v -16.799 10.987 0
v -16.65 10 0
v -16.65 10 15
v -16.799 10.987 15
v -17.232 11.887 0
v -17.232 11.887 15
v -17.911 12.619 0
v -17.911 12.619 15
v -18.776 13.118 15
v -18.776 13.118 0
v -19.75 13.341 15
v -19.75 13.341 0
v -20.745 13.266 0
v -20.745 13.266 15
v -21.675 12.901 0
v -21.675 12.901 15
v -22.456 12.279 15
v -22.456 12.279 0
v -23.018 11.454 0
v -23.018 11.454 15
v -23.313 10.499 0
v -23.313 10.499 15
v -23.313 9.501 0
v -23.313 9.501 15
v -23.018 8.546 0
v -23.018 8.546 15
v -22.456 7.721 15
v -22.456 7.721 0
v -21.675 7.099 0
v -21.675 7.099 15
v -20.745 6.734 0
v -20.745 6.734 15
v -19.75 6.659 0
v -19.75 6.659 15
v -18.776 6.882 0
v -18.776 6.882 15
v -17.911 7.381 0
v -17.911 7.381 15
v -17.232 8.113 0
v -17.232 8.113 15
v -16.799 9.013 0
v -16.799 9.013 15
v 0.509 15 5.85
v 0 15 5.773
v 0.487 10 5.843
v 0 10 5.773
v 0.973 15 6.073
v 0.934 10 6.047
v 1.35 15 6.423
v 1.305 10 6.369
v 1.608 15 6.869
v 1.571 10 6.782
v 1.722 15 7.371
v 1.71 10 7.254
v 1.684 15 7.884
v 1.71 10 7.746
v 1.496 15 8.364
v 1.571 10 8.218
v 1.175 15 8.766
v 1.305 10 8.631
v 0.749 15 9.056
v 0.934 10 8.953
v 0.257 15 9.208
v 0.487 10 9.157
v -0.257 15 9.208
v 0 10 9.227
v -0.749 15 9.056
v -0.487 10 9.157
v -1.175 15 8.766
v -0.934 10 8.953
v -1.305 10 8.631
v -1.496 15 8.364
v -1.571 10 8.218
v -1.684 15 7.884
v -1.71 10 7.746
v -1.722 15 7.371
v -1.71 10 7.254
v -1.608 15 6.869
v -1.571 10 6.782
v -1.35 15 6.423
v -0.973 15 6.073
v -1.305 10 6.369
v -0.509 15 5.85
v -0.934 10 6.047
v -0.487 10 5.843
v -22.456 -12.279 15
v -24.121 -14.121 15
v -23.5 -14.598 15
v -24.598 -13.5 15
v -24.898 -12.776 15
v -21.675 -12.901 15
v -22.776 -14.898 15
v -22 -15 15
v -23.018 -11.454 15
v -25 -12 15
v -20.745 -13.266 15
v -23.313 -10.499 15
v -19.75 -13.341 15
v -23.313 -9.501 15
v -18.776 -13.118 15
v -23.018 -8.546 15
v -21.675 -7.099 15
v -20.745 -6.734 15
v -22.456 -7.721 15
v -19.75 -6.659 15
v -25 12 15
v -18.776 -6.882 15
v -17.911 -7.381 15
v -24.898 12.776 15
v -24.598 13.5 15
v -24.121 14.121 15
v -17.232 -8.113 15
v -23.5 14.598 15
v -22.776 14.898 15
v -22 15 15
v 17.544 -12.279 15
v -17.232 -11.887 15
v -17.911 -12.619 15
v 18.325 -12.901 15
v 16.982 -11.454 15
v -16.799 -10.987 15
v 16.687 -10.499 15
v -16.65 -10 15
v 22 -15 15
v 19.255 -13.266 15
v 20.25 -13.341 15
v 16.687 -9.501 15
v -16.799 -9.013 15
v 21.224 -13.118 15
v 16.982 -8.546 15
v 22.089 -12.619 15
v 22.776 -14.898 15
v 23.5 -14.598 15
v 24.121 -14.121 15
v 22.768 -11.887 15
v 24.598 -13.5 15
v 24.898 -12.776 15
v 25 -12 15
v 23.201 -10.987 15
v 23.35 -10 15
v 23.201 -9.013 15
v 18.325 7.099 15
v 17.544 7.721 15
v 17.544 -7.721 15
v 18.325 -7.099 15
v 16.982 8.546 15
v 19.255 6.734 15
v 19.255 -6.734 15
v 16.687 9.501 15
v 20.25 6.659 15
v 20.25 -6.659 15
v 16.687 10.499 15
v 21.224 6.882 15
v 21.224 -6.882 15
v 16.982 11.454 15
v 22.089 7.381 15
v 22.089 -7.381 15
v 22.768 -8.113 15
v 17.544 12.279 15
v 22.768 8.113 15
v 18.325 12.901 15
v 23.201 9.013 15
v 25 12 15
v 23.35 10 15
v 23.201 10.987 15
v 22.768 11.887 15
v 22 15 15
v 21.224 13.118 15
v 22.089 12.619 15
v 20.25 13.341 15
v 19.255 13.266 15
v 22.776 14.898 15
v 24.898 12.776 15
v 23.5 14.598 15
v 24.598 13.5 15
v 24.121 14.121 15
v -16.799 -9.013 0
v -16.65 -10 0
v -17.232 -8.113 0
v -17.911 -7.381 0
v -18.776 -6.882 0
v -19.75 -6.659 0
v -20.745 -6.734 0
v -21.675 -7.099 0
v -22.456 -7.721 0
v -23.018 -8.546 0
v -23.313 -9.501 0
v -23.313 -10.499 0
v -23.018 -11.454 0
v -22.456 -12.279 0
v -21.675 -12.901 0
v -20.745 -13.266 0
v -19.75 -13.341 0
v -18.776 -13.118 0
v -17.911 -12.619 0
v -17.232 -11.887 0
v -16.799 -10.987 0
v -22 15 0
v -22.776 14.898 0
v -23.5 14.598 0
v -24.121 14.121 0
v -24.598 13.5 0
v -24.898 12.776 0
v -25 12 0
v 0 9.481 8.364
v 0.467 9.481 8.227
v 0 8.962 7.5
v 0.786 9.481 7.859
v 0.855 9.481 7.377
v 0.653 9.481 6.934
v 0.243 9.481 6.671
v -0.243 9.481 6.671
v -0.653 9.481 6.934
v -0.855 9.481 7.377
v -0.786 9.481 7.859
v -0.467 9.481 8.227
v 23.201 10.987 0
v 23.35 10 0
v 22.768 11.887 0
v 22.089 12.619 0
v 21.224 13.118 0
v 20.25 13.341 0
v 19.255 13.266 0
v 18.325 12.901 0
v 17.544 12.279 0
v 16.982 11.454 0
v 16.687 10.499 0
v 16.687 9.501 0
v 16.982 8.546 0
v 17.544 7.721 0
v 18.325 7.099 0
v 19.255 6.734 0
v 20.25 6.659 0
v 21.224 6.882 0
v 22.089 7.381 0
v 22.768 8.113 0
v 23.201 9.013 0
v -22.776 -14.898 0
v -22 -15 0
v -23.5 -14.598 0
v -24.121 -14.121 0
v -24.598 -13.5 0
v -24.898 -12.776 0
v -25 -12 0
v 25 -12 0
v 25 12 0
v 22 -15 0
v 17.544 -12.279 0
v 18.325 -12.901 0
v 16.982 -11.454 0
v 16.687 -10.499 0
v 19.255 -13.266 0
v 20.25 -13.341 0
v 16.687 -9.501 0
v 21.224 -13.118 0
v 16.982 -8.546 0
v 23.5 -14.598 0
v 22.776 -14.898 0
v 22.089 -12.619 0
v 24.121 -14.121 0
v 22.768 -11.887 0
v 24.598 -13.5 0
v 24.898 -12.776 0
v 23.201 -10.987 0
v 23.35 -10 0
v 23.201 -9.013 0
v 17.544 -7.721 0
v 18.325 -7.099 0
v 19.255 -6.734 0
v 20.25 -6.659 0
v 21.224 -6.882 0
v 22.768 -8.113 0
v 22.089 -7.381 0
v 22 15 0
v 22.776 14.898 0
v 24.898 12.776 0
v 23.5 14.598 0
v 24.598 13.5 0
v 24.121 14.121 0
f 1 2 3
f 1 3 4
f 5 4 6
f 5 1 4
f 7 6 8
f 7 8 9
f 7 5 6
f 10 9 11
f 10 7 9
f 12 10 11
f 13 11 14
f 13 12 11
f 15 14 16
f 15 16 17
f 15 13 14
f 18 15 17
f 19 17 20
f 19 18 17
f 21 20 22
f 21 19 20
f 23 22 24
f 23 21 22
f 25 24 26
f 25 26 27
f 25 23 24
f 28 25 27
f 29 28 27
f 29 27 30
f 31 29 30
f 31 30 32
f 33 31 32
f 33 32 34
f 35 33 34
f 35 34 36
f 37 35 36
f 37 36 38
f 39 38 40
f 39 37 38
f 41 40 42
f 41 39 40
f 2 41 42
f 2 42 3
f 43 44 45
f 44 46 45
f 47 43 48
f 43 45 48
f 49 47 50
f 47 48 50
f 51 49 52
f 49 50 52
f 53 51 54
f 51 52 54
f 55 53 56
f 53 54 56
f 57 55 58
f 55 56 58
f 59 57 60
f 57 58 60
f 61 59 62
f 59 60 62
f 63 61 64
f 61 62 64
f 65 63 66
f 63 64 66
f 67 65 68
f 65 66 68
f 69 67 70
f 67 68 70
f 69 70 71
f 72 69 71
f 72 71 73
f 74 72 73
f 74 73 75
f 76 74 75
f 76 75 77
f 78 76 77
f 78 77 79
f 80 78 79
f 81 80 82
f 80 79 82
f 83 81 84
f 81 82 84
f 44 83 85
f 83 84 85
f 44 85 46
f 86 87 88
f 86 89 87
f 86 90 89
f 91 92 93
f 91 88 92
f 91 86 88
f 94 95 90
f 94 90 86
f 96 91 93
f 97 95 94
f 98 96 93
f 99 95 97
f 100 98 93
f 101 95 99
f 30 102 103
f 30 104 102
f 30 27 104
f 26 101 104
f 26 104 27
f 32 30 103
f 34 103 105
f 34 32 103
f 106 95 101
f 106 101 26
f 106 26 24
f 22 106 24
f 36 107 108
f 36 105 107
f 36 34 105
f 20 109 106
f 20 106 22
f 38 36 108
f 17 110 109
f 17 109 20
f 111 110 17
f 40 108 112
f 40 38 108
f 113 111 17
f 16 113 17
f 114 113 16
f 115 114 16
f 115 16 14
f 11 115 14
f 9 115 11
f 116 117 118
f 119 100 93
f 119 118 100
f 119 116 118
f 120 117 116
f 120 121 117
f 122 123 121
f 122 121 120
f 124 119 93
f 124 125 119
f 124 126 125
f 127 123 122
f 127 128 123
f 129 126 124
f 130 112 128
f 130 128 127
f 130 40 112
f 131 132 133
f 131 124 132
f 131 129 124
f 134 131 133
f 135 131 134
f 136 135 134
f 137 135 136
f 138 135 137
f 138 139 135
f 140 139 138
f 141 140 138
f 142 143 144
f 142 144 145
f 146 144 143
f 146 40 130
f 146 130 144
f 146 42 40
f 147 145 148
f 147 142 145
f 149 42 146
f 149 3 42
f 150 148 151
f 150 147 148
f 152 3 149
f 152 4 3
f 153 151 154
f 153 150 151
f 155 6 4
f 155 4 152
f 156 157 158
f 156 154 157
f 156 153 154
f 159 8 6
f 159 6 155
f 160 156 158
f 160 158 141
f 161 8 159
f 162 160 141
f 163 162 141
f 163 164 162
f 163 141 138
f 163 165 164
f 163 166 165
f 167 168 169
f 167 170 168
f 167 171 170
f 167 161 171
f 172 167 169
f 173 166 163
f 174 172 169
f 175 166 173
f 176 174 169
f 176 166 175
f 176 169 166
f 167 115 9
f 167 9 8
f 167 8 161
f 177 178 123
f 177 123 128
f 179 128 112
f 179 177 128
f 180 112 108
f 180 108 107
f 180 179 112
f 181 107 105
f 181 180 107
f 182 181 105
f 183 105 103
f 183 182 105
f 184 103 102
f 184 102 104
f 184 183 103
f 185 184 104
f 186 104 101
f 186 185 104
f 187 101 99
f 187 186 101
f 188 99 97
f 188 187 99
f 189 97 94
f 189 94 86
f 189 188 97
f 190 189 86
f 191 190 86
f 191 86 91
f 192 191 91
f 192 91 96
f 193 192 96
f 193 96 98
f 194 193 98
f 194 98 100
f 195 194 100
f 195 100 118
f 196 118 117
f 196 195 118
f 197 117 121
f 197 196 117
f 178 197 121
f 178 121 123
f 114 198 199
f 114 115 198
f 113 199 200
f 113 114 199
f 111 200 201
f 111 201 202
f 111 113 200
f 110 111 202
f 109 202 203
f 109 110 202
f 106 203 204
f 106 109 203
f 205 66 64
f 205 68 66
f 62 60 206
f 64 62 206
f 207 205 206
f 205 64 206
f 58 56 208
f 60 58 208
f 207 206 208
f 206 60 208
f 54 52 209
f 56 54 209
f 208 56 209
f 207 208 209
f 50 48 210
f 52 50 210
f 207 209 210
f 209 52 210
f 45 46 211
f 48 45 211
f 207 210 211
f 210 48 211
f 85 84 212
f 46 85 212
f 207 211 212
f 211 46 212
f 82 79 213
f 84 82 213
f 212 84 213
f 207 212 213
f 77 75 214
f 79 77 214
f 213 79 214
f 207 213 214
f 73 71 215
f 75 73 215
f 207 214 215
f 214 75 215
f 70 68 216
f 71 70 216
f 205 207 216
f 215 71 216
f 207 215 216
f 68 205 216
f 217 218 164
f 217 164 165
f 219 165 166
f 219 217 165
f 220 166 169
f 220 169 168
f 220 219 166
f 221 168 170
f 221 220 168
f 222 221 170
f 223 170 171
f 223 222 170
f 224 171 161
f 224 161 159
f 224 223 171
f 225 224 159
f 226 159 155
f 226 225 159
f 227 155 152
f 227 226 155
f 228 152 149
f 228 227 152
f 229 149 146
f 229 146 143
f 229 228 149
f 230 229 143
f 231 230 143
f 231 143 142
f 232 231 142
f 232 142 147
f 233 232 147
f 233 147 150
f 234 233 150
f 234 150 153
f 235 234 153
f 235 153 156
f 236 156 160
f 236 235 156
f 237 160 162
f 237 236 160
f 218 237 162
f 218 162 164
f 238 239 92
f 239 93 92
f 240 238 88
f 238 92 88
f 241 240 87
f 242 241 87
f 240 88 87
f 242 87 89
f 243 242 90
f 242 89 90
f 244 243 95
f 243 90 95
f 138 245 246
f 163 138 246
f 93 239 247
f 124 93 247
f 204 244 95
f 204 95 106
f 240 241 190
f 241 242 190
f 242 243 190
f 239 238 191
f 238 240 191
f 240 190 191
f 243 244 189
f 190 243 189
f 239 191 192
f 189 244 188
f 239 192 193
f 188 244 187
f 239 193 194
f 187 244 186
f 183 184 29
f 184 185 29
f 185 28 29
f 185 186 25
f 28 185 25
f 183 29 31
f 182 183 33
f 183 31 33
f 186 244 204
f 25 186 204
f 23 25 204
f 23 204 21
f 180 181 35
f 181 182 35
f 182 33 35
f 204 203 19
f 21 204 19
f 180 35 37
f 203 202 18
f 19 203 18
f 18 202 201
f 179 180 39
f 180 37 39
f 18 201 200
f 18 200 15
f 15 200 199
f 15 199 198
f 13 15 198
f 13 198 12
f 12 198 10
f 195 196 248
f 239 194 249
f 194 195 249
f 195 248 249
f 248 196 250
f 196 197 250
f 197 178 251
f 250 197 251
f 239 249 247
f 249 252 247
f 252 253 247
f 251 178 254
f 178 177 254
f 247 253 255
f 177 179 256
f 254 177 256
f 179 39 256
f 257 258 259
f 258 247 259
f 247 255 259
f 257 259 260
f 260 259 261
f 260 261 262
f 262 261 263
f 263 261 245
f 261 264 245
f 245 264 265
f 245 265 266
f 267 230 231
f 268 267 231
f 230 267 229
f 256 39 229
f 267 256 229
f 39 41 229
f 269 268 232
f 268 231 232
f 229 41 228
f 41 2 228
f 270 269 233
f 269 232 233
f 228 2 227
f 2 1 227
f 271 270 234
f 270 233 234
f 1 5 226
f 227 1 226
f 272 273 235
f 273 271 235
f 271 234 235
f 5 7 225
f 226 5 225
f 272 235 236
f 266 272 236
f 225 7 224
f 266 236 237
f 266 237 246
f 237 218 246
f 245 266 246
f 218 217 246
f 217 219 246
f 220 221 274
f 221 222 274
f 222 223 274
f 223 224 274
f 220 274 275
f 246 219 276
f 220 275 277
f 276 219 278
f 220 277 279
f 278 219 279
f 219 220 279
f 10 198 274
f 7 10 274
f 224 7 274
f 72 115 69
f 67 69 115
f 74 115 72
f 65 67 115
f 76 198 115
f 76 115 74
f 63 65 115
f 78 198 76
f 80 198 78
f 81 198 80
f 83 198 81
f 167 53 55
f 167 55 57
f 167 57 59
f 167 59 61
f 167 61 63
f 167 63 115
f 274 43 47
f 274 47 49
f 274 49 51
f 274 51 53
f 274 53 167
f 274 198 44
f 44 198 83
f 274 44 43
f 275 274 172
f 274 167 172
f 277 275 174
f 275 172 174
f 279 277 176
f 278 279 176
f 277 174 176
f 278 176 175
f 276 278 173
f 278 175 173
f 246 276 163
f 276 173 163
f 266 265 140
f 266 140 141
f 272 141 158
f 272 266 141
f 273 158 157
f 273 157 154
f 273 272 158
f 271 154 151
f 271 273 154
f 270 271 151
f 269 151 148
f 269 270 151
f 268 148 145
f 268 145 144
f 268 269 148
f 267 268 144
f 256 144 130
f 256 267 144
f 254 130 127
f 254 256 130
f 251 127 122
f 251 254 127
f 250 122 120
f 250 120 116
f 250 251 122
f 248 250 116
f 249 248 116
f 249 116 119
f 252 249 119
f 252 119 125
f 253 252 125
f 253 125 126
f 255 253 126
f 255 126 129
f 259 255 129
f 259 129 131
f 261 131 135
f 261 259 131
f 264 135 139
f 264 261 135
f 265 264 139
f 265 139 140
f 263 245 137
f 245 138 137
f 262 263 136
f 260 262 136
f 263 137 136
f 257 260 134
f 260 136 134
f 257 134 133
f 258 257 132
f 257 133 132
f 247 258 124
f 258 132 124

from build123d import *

# Parameters (mm, degrees)
SKETCH2_W                 = 50
SKETCH2_H                 = 30
SKETCH2_R                 = 3.35
BOSS_EXTRUDE1_DEPTH       = 15
F_8_32_TAPPED_HOLE1_D     = 3.4544
F_8_32_TAPPED_HOLE1_DEPTH = 5
F_8_32_TAPPED_HOLE1_TIP   = 1.037806461
FILLET1_R                 = 3
FILLET2_R                 = 3
FILLET3_R                 = 3
FILLET4_R                 = 3


with BuildPart() as part:
    # Sketch2 → Boss-Extrude1 (new body)
    with BuildSketch(Plane.XY):
        Rectangle(SKETCH2_W, SKETCH2_H)
        with Locations((20, 10)):
            Circle(SKETCH2_R, mode=Mode.SUBTRACT)
        with Locations((-20, 10)):
            Circle(SKETCH2_R, mode=Mode.SUBTRACT)
        with Locations((-20, -10)):
            Circle(SKETCH2_R, mode=Mode.SUBTRACT)
        with Locations((20, -10)):
            Circle(SKETCH2_R, mode=Mode.SUBTRACT)
    extrude(amount=BOSS_EXTRUDE1_DEPTH)

    # #8-32 Tapped Hole1
    with Locations(Plane(origin=(0, 15, 7.5), x_dir=(0, 0, 1), z_dir=(0, 1, 0))):
        with Locations((0, 0)):
            Hole(F_8_32_TAPPED_HOLE1_D / 2, depth=F_8_32_TAPPED_HOLE1_DEPTH)
            with Locations((0, 0, -(F_8_32_TAPPED_HOLE1_DEPTH + F_8_32_TAPPED_HOLE1_TIP / 2))):  # 118° drill point
                Cone(0, F_8_32_TAPPED_HOLE1_D / 2, F_8_32_TAPPED_HOLE1_TIP, mode=Mode.SUBTRACT)

    # Fillet1
    fillet1_edges = [part.edges().sort_by_distance(p)[0] for p in [
        (25, 15, 7.5),
    ]]
    fillet(fillet1_edges, radius=FILLET1_R)

    # Fillet2
    fillet2_edges = [part.edges().sort_by_distance(p)[0] for p in [
        (-25, 15, 7.5),
    ]]
    fillet(fillet2_edges, radius=FILLET2_R)

    # Fillet3
    fillet3_edges = [part.edges().sort_by_distance(p)[0] for p in [
        (25, -15, 7.5),
    ]]
    fillet(fillet3_edges, radius=FILLET3_R)

    # Fillet4
    fillet4_edges = [part.edges().sort_by_distance(p)[0] for p in [
        (-25, -15, 7.5),
    ]]
    fillet(fillet4_edges, radius=FILLET4_R)


solid = part.part
